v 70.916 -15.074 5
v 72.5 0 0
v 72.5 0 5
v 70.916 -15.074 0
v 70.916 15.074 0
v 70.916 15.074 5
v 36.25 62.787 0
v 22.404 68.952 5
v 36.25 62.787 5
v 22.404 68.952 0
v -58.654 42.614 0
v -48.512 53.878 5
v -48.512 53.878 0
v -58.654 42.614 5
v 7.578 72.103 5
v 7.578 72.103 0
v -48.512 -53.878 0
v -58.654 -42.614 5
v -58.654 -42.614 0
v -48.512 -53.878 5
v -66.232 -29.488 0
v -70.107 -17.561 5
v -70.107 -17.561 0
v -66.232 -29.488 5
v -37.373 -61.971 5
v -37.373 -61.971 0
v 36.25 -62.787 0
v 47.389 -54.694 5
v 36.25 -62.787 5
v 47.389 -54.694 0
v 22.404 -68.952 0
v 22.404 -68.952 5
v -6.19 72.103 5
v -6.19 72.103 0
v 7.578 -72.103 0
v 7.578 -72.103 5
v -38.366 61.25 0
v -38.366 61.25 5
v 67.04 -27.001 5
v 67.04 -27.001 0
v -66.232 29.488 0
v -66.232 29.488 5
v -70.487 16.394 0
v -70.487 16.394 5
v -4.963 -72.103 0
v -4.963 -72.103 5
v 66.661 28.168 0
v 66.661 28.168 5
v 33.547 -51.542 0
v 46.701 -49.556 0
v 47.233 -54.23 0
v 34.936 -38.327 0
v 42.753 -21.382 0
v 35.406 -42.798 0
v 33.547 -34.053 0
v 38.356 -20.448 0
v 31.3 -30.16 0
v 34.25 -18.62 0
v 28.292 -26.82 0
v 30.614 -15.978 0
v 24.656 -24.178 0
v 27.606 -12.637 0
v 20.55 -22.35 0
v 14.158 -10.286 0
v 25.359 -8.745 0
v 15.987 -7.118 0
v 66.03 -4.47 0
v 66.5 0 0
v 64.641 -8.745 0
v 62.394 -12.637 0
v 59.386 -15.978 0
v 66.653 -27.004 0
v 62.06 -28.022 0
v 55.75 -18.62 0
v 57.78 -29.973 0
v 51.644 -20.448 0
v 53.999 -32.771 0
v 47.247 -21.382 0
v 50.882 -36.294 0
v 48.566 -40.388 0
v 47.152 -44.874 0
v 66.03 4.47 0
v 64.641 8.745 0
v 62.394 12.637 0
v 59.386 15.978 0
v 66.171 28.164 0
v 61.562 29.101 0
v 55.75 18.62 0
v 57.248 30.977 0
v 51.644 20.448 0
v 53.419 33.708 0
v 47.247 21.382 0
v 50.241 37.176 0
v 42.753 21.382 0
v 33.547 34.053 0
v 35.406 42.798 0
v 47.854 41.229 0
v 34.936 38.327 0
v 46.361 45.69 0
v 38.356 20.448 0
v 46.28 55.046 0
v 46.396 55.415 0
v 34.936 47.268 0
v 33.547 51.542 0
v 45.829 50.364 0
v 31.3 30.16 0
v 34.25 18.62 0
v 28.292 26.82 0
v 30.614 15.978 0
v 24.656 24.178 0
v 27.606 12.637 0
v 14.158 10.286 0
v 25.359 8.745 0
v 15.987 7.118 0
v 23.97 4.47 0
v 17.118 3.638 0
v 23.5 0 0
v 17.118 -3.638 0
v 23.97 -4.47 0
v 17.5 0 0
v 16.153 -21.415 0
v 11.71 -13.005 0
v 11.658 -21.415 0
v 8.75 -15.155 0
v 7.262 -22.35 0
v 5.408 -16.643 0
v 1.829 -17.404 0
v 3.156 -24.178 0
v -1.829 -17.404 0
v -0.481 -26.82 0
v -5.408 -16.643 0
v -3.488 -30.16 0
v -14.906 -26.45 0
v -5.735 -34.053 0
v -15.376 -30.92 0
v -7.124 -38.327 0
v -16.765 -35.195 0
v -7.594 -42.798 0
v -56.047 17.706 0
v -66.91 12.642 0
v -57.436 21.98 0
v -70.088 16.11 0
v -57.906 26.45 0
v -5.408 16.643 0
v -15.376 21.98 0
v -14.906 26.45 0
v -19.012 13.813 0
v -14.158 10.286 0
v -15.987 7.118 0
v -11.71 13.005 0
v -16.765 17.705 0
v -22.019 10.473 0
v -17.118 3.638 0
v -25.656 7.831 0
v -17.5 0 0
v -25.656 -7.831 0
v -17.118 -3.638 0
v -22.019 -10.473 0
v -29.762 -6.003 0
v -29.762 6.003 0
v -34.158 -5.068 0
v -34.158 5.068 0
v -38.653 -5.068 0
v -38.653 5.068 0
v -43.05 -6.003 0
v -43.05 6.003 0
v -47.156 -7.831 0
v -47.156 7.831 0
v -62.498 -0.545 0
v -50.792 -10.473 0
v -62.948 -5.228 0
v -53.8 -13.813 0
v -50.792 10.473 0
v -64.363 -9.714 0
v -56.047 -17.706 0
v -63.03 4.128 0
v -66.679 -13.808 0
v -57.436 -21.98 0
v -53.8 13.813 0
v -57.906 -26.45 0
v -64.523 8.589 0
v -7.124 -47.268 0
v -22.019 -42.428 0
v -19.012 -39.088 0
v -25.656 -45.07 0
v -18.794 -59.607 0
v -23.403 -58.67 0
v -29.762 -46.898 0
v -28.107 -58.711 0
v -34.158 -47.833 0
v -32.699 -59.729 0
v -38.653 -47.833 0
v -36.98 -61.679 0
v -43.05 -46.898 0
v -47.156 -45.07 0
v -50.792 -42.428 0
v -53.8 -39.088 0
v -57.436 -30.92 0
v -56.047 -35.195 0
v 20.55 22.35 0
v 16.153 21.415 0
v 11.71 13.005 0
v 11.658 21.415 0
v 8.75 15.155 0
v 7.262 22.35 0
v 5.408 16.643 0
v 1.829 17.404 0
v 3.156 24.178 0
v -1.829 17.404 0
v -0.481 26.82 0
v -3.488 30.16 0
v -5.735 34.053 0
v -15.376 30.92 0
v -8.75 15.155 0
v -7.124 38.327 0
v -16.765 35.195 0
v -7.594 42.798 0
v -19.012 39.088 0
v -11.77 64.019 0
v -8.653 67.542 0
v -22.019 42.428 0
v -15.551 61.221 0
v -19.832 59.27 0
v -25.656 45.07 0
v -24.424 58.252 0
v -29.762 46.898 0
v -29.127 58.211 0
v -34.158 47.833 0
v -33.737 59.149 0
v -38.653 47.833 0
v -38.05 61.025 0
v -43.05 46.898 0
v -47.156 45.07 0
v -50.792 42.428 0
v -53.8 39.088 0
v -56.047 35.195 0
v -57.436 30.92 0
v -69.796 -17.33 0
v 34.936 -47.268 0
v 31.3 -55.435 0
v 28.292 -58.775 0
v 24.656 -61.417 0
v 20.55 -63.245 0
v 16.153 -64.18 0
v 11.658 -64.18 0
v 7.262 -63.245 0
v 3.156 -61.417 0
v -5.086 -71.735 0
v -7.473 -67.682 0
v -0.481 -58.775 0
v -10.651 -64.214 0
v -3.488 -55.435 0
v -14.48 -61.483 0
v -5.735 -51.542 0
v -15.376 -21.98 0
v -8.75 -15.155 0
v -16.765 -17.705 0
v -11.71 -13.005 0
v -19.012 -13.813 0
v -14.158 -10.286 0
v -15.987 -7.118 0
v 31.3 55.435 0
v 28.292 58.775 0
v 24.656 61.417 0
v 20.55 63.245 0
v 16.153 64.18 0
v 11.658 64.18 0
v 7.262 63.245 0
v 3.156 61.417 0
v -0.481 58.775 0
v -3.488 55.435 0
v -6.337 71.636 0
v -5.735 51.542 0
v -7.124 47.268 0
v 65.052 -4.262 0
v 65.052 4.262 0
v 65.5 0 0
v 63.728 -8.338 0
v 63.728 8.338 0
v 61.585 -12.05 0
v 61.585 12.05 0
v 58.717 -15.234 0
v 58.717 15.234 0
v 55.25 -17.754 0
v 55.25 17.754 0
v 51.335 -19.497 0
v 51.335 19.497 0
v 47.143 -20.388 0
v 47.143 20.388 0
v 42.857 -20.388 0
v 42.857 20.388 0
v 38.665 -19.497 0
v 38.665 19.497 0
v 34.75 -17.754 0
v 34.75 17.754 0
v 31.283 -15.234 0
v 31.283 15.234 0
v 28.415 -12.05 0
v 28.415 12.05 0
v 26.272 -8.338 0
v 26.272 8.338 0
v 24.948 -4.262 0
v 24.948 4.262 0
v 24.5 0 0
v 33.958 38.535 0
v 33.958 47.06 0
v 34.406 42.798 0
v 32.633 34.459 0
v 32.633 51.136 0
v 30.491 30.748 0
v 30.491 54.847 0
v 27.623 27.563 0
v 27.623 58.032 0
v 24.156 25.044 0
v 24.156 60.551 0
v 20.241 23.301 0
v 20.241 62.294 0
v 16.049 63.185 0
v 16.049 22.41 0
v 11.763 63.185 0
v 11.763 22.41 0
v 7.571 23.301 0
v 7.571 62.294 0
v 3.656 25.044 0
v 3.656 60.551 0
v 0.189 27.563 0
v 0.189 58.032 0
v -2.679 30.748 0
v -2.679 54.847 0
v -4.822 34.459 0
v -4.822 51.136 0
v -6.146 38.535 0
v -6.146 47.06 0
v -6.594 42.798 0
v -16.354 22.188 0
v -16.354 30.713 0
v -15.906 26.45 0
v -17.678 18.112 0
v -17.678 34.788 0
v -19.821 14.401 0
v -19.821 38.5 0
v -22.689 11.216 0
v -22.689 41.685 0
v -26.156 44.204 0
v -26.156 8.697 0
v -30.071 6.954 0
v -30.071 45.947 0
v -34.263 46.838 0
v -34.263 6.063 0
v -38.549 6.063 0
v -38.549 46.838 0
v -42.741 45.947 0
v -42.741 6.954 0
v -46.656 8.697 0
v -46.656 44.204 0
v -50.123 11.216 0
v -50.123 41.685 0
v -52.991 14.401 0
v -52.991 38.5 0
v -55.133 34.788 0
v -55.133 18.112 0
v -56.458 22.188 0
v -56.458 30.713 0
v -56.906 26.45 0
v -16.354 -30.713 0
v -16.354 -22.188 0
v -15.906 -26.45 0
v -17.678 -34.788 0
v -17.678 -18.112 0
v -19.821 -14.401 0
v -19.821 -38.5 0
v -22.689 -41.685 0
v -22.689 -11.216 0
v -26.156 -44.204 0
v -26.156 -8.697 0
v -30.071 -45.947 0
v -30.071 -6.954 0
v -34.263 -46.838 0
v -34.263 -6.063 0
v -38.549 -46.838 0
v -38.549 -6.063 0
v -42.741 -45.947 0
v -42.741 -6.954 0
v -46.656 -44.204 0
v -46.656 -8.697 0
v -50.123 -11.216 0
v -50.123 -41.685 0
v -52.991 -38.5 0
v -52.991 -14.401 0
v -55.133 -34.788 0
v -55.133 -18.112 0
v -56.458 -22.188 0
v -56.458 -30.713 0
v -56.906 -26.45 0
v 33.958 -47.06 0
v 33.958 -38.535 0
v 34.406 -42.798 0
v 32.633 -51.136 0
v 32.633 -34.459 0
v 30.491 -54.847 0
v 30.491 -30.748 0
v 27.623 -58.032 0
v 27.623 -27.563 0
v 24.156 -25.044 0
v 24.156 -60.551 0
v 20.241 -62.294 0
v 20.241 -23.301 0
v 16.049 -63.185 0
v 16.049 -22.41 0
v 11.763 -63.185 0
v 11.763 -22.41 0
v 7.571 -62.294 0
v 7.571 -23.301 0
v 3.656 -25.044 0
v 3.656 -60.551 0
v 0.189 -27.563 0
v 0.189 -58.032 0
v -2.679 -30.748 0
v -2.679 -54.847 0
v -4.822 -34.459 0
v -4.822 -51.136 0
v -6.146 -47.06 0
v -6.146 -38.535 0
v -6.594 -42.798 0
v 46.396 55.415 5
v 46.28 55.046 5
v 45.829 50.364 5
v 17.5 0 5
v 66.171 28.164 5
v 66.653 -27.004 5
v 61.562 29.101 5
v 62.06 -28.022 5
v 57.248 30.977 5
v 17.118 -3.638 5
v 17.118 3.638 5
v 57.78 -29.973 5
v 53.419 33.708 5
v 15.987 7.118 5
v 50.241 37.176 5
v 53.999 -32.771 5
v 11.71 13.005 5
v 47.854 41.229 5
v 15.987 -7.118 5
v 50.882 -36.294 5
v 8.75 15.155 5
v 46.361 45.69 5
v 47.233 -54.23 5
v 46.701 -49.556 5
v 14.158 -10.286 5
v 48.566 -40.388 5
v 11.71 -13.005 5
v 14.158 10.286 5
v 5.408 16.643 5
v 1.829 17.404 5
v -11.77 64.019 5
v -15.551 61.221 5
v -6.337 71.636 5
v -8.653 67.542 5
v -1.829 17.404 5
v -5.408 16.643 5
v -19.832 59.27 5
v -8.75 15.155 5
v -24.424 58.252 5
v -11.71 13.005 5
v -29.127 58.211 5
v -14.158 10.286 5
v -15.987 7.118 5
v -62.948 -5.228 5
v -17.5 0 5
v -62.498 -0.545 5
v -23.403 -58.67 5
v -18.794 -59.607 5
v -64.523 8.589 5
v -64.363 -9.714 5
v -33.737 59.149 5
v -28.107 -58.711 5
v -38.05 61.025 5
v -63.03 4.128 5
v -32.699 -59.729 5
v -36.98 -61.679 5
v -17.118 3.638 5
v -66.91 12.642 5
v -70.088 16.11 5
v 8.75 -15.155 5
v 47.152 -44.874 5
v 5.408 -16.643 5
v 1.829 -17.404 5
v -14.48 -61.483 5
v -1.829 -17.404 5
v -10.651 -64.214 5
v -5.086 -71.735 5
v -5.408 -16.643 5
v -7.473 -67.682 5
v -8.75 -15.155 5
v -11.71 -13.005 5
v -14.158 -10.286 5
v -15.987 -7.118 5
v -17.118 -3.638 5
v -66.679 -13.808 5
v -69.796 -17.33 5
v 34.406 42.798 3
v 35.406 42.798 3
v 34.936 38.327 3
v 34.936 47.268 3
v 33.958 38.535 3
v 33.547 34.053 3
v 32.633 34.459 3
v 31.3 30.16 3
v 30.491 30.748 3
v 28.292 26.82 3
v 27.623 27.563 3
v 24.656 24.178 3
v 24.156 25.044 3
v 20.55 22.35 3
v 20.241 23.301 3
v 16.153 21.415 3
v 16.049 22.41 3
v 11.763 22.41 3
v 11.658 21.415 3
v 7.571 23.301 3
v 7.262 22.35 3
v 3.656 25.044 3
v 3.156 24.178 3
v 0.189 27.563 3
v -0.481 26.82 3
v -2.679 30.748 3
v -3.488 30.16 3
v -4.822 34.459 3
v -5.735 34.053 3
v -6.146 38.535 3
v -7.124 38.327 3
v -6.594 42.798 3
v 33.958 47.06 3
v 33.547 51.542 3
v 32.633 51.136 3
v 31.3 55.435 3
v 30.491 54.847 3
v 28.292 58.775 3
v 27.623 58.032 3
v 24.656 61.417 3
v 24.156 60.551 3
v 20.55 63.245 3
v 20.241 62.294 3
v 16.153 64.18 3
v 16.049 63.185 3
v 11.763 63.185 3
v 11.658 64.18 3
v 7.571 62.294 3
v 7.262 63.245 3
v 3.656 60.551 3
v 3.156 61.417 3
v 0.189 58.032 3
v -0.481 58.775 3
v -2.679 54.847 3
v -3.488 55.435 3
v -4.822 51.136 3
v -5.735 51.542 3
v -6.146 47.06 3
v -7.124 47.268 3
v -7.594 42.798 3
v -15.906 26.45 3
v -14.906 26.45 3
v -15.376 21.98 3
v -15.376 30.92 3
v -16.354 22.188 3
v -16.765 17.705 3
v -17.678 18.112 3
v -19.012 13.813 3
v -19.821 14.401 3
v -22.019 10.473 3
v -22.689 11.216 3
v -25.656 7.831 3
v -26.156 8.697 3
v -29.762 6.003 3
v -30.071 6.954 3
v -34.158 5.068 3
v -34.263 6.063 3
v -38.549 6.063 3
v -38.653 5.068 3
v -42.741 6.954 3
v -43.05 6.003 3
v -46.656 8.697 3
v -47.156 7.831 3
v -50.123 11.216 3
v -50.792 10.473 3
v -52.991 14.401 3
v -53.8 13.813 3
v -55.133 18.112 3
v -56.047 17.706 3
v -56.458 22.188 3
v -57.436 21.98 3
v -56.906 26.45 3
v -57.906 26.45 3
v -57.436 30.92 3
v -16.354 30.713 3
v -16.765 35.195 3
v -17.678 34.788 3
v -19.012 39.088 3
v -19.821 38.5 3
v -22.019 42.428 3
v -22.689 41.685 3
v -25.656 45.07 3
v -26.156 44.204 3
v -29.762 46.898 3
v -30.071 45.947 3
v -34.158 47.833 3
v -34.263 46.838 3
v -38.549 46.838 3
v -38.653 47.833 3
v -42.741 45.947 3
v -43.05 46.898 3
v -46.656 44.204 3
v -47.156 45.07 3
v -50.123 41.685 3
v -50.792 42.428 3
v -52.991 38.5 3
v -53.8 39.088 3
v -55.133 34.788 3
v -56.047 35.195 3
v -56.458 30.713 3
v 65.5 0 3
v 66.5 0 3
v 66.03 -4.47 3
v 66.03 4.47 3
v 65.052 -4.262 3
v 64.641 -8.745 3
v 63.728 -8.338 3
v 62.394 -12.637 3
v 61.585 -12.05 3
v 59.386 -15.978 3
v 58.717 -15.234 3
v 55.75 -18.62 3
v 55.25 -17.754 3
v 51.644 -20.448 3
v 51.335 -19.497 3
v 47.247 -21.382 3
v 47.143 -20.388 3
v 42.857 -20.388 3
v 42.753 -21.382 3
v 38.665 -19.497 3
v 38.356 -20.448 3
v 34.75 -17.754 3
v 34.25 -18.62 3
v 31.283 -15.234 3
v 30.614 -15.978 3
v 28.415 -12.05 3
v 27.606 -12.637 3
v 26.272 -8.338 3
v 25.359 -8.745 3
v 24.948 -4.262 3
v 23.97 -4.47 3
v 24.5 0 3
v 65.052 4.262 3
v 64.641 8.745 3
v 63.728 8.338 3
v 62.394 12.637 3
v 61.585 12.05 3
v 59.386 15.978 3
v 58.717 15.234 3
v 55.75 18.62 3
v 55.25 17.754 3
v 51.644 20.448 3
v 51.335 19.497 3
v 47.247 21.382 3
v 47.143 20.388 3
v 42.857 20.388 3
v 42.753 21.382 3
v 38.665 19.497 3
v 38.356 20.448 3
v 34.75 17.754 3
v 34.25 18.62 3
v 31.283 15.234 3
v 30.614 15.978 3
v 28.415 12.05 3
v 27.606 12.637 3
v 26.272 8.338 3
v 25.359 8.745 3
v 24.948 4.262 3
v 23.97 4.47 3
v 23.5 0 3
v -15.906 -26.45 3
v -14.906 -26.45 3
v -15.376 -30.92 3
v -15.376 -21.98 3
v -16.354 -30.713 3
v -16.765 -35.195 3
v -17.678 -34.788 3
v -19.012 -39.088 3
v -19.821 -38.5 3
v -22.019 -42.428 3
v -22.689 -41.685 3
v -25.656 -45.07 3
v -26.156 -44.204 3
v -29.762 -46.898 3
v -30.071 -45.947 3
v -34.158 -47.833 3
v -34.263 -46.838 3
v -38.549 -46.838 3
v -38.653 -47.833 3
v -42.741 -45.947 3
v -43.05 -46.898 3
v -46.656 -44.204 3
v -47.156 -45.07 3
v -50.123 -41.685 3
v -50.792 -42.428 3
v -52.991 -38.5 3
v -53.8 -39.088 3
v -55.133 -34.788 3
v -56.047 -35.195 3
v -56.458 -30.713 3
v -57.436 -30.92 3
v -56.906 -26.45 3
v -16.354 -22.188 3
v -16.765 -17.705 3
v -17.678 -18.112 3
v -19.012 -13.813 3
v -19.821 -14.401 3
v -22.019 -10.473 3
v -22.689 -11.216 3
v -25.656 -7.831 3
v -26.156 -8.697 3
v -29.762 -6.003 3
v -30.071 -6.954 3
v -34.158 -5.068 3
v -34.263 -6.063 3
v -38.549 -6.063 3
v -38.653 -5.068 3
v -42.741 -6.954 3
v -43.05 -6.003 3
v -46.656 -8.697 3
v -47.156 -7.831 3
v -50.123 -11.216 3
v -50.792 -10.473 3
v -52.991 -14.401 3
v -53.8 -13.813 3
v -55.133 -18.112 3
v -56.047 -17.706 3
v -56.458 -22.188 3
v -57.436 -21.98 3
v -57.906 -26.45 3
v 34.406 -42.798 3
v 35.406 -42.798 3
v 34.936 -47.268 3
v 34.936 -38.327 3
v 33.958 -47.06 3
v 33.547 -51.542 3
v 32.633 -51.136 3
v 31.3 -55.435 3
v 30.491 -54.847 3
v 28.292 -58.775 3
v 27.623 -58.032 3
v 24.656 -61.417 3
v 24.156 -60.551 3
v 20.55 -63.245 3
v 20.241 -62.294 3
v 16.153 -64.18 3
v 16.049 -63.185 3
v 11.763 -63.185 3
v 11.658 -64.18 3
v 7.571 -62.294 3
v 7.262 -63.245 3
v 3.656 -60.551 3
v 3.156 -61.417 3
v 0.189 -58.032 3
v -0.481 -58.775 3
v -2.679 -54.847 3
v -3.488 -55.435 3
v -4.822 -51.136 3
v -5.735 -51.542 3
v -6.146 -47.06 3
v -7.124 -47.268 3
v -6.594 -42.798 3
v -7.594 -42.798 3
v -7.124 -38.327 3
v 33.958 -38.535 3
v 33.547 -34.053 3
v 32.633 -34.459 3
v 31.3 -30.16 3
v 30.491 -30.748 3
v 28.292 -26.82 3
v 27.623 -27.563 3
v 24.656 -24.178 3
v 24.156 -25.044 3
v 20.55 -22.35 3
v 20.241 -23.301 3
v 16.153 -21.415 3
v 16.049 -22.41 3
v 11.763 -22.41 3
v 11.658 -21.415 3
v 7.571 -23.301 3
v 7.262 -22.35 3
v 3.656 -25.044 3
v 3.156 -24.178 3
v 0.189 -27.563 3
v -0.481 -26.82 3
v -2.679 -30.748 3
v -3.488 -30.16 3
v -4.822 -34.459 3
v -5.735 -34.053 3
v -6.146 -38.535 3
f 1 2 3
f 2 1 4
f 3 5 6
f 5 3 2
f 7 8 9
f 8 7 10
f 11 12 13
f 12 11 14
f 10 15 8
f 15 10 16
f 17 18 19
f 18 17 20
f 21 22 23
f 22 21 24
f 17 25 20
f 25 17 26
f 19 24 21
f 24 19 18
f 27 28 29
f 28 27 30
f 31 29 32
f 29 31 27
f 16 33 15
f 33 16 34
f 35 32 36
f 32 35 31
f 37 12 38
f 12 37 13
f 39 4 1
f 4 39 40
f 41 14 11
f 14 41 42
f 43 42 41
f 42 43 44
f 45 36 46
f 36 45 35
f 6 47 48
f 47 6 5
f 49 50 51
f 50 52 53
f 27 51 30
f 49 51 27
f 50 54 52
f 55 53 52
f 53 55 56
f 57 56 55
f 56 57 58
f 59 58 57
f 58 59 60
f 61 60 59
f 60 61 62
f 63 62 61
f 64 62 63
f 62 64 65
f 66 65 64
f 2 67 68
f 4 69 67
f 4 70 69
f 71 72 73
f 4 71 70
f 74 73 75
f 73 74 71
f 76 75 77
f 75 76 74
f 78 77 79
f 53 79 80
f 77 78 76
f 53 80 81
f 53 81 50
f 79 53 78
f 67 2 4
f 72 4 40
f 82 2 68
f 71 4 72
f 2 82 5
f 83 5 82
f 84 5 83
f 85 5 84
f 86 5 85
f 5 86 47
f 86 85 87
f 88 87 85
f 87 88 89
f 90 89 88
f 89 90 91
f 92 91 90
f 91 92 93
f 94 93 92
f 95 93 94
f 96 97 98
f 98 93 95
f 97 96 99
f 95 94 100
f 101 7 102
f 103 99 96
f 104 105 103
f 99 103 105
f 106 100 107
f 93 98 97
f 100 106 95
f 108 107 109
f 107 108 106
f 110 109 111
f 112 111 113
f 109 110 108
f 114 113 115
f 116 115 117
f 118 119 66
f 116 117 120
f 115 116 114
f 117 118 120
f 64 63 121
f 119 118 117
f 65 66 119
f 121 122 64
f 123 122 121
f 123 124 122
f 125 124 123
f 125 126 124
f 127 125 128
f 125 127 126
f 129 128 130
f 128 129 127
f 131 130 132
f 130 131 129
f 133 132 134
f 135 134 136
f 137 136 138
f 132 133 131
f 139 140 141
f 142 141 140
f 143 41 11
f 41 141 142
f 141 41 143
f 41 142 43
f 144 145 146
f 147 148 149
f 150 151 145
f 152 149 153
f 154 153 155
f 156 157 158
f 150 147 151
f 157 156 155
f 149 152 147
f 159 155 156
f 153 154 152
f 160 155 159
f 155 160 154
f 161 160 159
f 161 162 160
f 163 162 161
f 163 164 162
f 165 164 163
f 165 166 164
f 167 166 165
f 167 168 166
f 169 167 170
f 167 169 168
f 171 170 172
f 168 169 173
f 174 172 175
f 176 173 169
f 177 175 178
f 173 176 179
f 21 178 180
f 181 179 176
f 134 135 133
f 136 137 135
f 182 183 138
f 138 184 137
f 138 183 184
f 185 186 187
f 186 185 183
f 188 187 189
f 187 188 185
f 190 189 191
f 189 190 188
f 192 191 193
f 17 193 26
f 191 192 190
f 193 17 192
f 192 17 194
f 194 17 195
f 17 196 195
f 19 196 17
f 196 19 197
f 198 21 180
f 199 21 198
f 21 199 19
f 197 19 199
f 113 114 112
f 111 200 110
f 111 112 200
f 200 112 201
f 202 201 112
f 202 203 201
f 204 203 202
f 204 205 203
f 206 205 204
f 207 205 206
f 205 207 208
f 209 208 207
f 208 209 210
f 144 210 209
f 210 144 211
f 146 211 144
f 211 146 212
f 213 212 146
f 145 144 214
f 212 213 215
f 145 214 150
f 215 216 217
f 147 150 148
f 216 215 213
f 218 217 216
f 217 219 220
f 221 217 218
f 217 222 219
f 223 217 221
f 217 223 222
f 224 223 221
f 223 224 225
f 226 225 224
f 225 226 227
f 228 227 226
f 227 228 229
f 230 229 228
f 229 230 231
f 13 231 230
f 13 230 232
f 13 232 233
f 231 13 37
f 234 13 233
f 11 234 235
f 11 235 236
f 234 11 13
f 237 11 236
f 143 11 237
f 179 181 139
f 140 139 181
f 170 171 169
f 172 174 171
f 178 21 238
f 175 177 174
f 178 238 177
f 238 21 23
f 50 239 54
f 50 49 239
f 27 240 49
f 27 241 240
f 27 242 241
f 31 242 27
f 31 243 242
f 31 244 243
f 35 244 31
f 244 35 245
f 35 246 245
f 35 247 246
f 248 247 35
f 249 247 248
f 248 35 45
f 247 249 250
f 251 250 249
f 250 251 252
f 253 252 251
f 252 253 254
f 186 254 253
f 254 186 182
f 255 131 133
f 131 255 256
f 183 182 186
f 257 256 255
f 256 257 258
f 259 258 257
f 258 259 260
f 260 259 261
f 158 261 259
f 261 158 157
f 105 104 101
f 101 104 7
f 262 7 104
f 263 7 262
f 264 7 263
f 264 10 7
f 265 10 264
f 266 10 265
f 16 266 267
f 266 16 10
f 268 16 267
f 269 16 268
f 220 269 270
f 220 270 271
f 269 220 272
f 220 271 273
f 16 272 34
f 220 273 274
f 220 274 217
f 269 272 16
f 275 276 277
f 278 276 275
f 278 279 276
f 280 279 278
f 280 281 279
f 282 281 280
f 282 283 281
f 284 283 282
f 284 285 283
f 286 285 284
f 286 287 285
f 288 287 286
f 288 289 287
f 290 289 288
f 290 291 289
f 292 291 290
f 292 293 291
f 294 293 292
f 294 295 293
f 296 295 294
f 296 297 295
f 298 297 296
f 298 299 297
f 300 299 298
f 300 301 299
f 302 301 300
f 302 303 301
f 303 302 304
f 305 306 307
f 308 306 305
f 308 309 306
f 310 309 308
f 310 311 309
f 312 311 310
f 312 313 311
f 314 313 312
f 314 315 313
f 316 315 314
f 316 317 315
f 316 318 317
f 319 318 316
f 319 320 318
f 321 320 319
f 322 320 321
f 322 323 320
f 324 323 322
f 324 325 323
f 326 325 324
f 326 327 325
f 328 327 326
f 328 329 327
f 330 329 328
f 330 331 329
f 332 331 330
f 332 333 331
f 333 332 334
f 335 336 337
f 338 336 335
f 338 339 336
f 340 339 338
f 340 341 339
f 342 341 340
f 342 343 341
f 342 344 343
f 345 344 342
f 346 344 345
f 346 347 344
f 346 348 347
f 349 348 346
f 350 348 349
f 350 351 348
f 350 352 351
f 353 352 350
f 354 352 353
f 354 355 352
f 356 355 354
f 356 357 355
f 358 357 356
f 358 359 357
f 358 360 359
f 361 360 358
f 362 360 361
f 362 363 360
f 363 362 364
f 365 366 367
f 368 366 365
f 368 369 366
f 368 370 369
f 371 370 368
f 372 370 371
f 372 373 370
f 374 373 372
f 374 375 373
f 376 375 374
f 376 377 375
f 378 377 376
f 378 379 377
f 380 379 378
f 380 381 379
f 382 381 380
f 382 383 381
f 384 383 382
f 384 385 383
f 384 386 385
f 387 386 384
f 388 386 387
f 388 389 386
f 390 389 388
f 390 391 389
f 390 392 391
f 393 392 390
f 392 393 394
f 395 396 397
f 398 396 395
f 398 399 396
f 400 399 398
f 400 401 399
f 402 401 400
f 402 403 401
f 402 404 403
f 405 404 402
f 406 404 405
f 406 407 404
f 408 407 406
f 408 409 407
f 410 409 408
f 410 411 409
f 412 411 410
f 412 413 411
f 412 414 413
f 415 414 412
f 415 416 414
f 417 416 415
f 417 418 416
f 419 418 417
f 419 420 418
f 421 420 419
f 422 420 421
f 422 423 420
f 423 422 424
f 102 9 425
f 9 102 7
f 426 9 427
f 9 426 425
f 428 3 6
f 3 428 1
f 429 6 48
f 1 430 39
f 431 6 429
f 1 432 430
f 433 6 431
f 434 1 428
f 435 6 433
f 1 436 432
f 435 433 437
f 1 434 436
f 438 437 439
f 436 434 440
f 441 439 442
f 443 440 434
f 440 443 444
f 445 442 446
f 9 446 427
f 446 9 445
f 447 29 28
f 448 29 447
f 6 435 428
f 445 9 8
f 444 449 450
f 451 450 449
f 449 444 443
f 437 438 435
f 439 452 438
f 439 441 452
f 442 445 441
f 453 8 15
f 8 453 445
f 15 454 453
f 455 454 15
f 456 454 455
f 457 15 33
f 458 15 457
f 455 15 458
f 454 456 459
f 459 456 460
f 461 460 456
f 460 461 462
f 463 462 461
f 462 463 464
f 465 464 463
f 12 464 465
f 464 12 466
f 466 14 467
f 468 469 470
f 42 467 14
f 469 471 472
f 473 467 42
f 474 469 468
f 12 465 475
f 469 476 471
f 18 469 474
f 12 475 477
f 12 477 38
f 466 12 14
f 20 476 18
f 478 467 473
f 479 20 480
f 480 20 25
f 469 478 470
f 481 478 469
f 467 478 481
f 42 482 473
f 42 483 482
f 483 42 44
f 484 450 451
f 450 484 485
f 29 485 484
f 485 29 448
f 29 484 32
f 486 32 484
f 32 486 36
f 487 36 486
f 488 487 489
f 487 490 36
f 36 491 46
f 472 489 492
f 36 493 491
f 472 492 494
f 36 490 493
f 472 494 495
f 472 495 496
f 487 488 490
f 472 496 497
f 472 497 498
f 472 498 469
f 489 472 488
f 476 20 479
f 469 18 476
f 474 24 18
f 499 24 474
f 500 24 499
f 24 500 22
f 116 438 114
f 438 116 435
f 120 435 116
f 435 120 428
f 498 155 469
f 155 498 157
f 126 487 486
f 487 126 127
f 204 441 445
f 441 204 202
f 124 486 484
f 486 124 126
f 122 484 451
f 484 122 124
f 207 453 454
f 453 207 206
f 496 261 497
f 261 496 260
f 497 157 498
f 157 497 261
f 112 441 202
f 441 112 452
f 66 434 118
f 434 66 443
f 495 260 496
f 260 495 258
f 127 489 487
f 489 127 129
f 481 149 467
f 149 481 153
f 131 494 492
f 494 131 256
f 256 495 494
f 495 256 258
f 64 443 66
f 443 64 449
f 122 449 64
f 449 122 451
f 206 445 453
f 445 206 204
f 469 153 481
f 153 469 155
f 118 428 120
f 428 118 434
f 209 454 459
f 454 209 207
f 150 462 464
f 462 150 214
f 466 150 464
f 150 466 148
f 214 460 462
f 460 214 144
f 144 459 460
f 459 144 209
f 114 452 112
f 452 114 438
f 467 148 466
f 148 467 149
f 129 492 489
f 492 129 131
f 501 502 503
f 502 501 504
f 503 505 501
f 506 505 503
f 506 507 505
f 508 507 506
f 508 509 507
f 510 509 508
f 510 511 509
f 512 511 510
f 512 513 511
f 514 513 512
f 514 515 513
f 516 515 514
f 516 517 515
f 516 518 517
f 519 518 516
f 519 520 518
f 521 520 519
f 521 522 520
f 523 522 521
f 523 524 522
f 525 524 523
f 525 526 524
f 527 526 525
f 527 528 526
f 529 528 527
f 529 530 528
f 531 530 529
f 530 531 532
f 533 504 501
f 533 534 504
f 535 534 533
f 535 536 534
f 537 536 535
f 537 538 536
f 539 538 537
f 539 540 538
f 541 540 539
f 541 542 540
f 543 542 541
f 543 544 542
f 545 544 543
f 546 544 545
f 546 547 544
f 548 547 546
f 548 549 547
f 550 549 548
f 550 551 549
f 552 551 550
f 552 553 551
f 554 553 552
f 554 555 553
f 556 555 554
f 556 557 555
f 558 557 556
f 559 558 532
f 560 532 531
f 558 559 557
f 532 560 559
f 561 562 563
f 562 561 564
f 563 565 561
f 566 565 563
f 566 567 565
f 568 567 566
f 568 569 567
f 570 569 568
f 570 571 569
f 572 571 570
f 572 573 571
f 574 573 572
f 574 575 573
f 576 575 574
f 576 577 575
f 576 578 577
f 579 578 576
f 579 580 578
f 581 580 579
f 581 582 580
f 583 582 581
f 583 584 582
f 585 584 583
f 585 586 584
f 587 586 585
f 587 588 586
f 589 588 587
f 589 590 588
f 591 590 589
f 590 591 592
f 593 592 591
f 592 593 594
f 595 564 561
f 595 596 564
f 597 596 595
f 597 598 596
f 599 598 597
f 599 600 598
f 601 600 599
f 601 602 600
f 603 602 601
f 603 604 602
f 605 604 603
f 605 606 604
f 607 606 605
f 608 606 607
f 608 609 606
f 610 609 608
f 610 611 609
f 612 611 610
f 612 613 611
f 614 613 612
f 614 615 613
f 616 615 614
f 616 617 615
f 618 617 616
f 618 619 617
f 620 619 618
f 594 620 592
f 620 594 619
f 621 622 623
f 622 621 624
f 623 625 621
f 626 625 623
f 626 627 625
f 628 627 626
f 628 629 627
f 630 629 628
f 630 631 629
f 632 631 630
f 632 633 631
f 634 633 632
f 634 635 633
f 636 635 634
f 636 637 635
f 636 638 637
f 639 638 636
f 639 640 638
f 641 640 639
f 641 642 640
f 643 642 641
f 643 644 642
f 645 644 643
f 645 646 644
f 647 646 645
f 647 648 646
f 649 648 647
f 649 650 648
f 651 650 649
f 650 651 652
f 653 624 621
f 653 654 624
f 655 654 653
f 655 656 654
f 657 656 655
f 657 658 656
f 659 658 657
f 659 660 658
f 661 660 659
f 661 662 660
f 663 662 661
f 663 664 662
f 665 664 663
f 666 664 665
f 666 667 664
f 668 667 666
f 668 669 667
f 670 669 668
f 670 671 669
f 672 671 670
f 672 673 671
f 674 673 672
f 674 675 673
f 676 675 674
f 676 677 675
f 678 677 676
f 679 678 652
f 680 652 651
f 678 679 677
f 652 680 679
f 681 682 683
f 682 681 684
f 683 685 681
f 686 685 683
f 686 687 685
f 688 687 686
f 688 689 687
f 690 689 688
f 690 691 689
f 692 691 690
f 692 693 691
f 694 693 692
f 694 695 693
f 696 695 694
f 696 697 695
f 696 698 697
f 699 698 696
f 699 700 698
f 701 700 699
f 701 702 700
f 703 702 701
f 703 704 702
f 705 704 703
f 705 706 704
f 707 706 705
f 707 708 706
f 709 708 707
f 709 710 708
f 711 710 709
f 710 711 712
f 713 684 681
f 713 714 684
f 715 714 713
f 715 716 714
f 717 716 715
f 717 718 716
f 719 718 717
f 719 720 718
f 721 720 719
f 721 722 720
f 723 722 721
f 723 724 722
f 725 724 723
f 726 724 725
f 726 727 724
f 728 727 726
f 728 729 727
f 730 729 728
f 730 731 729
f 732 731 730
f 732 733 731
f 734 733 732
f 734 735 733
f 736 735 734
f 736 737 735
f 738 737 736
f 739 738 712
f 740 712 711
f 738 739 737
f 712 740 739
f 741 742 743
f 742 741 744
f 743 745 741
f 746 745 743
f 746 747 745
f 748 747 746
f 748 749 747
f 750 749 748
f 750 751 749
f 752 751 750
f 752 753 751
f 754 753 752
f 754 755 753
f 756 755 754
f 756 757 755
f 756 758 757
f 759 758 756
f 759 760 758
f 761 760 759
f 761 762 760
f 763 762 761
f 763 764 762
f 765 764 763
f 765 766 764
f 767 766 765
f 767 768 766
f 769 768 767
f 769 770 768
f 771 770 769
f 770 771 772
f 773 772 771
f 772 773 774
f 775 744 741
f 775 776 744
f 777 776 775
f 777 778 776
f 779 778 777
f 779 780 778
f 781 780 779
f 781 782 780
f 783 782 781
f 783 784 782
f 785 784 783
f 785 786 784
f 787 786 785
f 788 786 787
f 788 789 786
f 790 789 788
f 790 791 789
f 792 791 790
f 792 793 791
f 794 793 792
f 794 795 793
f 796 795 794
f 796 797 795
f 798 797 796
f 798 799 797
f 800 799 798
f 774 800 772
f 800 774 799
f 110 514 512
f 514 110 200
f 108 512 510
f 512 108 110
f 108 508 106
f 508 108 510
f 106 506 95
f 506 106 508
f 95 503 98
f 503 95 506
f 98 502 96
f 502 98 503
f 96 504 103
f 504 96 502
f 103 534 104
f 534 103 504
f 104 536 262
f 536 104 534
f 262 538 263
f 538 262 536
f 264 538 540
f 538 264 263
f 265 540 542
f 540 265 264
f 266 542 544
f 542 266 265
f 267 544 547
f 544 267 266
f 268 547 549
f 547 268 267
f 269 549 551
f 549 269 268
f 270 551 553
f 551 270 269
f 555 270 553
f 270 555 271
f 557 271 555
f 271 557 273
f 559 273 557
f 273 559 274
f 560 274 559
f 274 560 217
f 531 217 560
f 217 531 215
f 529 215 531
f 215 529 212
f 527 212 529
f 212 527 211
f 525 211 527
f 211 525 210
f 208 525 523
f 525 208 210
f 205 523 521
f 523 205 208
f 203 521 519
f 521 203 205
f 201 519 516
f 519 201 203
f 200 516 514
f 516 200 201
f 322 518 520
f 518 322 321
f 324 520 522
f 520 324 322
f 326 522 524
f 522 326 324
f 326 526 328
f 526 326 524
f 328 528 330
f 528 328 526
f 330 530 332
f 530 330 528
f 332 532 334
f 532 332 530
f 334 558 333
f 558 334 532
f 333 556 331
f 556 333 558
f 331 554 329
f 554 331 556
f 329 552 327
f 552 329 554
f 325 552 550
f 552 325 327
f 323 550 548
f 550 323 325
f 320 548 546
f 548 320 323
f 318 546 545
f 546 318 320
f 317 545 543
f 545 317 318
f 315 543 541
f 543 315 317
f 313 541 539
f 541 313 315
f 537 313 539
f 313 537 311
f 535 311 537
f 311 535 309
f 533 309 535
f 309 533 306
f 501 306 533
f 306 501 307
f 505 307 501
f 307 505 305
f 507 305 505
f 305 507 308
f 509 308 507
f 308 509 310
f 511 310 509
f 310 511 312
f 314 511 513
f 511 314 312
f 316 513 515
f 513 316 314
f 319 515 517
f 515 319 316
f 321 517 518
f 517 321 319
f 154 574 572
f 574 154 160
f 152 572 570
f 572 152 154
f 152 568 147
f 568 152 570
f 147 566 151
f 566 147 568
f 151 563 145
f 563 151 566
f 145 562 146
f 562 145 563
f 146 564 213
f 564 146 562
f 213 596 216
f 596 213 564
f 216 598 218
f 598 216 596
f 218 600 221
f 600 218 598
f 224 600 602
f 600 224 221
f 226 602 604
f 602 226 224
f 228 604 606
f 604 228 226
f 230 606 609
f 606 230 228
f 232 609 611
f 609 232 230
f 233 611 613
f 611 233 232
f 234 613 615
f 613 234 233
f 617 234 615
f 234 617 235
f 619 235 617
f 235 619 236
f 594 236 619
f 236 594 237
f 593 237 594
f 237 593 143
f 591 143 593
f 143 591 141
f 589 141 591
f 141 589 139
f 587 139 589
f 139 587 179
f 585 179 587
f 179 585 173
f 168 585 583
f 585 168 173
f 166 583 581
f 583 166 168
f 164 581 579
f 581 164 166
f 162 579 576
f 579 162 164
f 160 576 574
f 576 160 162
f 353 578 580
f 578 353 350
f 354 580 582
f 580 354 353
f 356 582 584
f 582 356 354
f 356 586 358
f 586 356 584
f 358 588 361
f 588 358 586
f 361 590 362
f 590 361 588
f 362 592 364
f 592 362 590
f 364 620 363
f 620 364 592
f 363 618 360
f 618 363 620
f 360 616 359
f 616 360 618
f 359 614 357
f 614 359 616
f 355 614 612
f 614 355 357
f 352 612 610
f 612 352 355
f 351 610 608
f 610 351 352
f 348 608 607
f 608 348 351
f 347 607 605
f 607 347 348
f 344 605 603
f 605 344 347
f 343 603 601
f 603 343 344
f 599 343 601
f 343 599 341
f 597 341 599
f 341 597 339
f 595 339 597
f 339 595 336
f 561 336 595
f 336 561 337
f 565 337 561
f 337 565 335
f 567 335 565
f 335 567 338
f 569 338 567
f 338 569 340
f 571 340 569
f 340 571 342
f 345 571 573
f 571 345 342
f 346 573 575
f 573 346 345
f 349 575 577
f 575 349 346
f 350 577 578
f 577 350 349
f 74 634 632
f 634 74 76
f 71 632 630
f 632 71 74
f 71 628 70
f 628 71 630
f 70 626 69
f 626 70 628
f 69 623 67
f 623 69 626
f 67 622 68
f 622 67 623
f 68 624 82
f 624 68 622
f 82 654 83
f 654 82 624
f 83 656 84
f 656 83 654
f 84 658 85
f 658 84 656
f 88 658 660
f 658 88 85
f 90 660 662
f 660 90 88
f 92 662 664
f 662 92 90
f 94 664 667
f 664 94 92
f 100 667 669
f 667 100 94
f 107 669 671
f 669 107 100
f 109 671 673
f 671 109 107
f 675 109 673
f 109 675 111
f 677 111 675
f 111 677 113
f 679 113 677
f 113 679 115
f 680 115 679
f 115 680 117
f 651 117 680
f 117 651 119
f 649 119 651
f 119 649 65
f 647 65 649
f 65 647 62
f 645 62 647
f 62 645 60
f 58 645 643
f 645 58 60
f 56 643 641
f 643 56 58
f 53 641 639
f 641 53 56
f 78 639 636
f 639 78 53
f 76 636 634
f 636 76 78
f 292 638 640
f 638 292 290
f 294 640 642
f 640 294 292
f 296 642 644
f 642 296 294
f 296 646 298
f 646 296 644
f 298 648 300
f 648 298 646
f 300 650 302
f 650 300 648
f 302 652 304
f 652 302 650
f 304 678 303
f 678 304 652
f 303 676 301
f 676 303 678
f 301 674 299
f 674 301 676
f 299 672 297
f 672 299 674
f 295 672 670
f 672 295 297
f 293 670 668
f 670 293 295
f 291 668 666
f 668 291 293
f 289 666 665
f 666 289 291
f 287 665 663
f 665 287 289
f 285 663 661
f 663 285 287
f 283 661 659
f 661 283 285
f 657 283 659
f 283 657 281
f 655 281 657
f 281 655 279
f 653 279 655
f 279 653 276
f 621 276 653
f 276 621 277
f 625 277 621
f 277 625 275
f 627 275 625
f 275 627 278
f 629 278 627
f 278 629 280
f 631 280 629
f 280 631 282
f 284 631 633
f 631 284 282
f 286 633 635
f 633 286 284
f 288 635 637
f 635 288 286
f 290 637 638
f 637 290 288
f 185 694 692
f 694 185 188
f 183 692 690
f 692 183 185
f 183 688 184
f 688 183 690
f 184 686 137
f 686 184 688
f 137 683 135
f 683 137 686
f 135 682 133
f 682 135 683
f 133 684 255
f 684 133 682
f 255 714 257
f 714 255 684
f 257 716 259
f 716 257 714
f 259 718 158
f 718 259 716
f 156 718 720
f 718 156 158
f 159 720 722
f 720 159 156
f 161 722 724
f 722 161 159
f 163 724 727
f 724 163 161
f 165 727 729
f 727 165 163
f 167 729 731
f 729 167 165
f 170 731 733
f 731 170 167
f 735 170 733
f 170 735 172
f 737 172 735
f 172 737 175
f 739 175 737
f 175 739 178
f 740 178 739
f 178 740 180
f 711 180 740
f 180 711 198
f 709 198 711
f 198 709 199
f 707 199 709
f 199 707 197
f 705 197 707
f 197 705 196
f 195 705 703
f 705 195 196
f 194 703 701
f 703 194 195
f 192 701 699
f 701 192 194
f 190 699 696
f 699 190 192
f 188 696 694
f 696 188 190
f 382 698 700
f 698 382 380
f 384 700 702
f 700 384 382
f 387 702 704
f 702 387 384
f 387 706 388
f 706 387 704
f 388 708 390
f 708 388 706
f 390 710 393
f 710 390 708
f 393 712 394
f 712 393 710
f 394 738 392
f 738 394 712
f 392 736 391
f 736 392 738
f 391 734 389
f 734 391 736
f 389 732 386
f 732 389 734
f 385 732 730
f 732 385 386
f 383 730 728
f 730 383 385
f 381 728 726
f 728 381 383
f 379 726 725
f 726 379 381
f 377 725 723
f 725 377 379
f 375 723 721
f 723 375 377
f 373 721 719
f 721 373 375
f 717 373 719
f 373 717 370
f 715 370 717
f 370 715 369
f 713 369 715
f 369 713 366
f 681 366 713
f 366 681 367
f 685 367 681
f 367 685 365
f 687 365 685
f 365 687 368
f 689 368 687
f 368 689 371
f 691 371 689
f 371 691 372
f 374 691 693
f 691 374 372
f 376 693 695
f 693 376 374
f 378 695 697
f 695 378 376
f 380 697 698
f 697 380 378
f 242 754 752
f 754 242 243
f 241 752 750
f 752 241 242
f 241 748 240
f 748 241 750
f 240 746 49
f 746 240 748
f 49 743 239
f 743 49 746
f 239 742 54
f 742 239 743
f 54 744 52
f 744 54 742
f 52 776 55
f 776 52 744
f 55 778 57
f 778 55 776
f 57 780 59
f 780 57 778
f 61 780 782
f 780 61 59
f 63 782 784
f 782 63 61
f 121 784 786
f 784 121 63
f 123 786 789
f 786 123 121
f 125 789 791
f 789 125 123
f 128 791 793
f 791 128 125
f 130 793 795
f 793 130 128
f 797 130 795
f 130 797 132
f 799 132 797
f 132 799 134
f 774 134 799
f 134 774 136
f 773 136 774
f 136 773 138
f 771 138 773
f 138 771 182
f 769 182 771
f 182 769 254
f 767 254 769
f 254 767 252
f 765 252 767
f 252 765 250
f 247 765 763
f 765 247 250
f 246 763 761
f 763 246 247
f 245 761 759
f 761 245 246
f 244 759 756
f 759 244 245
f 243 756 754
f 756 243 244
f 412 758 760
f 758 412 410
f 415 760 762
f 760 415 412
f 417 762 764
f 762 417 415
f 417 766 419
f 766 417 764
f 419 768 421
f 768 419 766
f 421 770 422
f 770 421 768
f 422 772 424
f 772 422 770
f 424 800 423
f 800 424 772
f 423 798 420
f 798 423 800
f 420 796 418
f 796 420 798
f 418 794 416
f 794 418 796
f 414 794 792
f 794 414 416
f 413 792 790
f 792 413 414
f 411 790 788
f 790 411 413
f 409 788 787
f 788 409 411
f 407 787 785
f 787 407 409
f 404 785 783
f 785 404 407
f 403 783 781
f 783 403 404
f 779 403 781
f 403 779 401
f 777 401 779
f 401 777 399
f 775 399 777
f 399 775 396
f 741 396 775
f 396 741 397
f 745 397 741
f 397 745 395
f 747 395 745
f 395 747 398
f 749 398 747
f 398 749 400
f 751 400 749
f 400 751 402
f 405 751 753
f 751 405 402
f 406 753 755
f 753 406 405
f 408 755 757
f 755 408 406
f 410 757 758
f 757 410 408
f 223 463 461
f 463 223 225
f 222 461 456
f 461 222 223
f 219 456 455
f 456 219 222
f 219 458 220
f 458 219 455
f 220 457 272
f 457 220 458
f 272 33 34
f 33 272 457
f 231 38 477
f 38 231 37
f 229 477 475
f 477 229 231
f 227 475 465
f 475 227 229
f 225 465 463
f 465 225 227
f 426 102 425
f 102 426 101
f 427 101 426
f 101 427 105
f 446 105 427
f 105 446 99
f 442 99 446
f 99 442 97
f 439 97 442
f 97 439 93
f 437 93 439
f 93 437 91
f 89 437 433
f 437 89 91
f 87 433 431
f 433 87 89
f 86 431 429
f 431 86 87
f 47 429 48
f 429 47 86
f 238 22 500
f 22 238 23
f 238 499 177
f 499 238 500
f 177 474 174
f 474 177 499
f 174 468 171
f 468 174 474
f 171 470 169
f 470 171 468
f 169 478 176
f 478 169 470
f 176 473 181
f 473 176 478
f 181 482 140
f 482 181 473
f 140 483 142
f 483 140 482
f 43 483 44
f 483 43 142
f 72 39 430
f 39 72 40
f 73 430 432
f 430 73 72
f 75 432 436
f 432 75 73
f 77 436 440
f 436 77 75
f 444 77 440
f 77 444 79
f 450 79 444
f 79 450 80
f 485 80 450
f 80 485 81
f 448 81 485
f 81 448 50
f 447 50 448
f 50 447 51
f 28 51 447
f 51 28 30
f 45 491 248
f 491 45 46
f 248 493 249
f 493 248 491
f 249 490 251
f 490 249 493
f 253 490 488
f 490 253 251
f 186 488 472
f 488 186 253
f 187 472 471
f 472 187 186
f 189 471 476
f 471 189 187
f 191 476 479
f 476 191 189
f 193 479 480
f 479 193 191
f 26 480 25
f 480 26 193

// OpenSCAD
stand_radius = 45;


difference(){
    linear_extrude(5) circle(d=145);
    linear_extrude(5) circle(d=stand_radius-10);
    
    
    linear_extrude(3)
    for(i = [1:5]){
        rotate([0,0,360/5*i])
        translate([stand_radius, 0, 0])
        paper_roll();
    }
    
    linear_extrude(5)
    for(i = [1:5]){
        rotate([0,0,360/5*i + 365/10])
        translate([stand_radius+40, 0, 0])
        circle(d=45);
    }
}
module paper_roll(){

difference(){
    circle(d=43);
    circle(d=41);
}
}

#circle(d=128);
